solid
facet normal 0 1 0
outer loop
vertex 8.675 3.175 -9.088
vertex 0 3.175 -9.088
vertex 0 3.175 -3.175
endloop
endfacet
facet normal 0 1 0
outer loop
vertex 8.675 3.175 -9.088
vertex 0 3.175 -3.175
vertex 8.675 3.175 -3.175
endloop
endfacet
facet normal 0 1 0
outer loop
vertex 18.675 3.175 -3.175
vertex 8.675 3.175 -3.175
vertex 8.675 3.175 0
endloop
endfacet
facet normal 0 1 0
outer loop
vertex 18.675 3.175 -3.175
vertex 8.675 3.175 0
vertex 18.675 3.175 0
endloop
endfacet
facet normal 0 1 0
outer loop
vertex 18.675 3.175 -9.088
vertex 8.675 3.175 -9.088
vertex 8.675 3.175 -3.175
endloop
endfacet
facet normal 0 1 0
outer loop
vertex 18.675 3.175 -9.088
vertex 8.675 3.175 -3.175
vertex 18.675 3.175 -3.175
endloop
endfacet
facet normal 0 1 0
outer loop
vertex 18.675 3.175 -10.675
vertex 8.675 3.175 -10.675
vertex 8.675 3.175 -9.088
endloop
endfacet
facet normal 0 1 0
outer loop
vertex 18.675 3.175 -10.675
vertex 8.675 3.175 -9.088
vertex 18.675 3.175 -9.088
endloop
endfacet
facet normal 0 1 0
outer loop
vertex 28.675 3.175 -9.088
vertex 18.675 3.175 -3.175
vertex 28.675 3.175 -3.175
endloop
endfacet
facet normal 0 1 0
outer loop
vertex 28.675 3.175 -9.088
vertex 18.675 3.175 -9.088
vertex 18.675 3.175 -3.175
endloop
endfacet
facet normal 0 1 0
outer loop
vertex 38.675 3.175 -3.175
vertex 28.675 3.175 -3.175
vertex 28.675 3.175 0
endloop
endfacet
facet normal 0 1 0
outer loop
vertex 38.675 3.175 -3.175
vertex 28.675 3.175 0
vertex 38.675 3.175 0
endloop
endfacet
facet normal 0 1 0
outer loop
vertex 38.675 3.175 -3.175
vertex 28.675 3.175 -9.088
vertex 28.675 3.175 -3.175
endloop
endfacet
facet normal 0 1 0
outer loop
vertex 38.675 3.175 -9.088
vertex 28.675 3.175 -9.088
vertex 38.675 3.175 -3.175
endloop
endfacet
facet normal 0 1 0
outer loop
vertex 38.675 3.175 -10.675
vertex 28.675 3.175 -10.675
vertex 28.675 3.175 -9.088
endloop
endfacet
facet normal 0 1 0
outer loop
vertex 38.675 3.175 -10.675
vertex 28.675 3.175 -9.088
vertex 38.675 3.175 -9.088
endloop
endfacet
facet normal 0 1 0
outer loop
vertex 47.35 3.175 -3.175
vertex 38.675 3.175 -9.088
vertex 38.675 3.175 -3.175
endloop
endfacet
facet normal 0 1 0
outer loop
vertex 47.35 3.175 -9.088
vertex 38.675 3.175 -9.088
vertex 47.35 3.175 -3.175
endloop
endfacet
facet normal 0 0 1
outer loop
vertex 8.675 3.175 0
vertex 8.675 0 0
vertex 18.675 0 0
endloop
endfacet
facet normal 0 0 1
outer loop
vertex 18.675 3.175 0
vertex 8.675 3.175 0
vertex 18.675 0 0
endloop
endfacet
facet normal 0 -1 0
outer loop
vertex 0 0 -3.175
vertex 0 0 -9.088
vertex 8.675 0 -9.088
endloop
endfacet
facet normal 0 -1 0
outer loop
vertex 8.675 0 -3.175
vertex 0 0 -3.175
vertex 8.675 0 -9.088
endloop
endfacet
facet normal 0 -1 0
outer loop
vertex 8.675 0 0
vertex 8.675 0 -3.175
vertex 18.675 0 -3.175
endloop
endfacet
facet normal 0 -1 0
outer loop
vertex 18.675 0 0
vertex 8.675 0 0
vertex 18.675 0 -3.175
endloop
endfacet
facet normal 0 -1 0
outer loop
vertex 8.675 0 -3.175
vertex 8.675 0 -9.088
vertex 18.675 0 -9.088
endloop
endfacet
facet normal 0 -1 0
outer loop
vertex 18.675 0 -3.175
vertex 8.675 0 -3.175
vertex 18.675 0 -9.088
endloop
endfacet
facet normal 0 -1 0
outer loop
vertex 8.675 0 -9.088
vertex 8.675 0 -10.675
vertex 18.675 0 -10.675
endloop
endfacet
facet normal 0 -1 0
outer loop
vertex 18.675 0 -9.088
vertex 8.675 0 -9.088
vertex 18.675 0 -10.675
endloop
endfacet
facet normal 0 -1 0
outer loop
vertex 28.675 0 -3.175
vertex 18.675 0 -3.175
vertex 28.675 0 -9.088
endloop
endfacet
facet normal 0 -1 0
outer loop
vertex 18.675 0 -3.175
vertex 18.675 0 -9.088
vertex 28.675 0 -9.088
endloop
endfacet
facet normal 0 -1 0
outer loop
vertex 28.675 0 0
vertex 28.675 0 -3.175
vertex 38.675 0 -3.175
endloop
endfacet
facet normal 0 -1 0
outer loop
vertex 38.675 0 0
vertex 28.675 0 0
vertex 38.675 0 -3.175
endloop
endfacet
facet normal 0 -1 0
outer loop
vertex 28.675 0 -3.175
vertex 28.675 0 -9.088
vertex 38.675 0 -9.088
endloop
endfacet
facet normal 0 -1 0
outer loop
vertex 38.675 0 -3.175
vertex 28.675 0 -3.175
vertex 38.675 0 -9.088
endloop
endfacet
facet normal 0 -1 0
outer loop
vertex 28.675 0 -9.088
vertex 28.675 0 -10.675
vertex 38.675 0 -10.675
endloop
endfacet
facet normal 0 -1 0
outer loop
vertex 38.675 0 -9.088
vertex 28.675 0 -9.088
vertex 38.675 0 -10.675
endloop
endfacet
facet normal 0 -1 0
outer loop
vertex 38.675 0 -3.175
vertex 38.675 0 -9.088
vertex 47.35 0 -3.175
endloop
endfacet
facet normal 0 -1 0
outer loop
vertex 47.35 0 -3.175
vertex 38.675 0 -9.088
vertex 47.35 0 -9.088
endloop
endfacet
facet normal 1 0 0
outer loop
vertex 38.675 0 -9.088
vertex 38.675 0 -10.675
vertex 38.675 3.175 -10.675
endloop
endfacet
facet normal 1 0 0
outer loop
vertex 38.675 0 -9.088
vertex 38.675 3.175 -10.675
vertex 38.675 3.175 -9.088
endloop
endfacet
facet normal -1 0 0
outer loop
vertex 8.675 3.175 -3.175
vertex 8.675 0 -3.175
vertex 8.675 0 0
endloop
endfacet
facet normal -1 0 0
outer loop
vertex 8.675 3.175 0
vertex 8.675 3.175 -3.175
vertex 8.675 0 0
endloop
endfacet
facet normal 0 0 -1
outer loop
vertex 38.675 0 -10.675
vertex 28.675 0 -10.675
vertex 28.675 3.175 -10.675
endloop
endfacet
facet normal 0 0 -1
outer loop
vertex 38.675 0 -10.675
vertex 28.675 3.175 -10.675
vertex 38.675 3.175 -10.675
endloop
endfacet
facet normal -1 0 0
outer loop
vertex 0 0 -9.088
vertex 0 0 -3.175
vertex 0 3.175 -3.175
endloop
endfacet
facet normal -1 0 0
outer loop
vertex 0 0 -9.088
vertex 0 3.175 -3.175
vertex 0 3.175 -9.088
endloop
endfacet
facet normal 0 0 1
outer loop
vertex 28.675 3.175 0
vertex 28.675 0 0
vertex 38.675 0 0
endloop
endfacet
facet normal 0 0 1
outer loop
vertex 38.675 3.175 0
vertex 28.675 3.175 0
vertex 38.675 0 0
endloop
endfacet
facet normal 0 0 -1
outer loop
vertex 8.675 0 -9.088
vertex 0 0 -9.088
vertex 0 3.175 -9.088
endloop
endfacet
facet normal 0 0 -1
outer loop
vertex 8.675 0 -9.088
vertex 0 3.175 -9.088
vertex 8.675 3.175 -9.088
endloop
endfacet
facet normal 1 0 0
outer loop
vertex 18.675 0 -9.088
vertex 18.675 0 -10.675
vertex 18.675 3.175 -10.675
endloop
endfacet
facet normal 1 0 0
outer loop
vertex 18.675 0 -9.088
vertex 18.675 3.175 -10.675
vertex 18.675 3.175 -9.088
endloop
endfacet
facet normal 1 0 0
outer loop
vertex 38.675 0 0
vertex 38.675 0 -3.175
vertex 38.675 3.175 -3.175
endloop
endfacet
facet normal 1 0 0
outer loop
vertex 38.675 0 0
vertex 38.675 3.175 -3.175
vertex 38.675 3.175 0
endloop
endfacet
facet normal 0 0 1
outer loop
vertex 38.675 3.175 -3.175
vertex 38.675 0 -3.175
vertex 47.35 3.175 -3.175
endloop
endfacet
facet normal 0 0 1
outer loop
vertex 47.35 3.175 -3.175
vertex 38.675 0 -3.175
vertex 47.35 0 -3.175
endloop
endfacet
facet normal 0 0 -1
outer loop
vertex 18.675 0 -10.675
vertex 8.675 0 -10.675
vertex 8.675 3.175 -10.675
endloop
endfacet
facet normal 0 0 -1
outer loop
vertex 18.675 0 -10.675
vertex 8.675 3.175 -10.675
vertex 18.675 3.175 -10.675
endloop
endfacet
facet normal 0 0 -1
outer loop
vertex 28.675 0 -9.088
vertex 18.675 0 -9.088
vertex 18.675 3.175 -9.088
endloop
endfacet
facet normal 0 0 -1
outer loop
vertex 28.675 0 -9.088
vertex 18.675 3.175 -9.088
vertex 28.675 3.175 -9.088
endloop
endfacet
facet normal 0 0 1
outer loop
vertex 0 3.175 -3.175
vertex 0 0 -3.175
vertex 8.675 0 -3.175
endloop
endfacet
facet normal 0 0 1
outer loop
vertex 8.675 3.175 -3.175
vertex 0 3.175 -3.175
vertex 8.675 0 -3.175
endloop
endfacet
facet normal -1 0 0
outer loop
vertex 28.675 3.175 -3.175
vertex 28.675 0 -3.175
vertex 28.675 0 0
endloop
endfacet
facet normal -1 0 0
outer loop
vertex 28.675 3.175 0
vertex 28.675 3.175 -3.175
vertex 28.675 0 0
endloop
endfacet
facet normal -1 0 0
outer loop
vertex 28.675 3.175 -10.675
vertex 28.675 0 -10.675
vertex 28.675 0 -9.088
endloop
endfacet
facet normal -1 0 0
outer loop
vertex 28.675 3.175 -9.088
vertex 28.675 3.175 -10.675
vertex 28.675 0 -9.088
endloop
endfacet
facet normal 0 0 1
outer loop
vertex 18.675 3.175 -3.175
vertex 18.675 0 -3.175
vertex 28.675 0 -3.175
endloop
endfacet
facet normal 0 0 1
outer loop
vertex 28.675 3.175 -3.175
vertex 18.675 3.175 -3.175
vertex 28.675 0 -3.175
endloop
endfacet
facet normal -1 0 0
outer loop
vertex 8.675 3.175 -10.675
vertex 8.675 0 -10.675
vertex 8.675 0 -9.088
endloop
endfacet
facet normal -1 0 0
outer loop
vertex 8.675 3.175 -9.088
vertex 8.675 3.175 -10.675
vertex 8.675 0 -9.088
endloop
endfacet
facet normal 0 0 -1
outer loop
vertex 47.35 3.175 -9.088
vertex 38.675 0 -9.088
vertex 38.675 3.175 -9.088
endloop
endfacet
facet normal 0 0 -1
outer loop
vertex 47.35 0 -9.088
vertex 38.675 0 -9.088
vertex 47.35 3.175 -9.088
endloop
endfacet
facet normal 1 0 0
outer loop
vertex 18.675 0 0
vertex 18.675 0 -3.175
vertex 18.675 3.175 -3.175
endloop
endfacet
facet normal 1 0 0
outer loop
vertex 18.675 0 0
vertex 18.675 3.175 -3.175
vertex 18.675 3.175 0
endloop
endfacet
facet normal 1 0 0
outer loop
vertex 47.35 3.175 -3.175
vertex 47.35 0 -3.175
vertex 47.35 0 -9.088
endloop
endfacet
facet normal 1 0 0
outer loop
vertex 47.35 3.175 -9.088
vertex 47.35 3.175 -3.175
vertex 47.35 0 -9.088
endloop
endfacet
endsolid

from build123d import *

# Parameters (mm, degrees)
SKETCH1_W           = 47.35
SKETCH1_H           = 10.675
BOSS_EXTRUDE1_DEPTH = 3.175
SKETCH2_W           = 8.675
SKETCH2_H           = 3.175
SKETCH2_W_2         = 10
SKETCH2_H_2         = 1.5875
CUT_EXTRUDE1_DEPTH  = 4.175


with BuildPart() as part:
    # Sketch1 → Boss-Extrude1 (new body)
    with BuildSketch(Plane(origin=(0, 0, 0), x_dir=(1, 0, 0), z_dir=(0, 1, 0))):
        with Locations((23.675, 5.3375)):
            Rectangle(SKETCH1_W, SKETCH1_H)
    extrude(amount=BOSS_EXTRUDE1_DEPTH)

    # Sketch2 → Cut-Extrude1 (cut, through all)
    with BuildSketch(Plane.XZ):
        with Locations((43.0125, -1.5875)):
            Rectangle(SKETCH2_W, SKETCH2_H)
        with Locations((23.675, -1.5875)):
            Rectangle(SKETCH2_W_2, SKETCH2_H)
        with Locations((4.3375, -1.5875)):
            Rectangle(SKETCH2_W, SKETCH2_H)
        with Locations((43.0125, -9.88125)):
            Rectangle(SKETCH2_W, SKETCH2_H_2)
        with Locations((23.675, -9.88125)):
            Rectangle(SKETCH2_W_2, SKETCH2_H_2)
        with Locations((4.3375, -9.88125)):
            Rectangle(SKETCH2_W, SKETCH2_H_2)
    extrude(amount=-CUT_EXTRUDE1_DEPTH, mode=Mode.SUBTRACT)


solid = part.part
